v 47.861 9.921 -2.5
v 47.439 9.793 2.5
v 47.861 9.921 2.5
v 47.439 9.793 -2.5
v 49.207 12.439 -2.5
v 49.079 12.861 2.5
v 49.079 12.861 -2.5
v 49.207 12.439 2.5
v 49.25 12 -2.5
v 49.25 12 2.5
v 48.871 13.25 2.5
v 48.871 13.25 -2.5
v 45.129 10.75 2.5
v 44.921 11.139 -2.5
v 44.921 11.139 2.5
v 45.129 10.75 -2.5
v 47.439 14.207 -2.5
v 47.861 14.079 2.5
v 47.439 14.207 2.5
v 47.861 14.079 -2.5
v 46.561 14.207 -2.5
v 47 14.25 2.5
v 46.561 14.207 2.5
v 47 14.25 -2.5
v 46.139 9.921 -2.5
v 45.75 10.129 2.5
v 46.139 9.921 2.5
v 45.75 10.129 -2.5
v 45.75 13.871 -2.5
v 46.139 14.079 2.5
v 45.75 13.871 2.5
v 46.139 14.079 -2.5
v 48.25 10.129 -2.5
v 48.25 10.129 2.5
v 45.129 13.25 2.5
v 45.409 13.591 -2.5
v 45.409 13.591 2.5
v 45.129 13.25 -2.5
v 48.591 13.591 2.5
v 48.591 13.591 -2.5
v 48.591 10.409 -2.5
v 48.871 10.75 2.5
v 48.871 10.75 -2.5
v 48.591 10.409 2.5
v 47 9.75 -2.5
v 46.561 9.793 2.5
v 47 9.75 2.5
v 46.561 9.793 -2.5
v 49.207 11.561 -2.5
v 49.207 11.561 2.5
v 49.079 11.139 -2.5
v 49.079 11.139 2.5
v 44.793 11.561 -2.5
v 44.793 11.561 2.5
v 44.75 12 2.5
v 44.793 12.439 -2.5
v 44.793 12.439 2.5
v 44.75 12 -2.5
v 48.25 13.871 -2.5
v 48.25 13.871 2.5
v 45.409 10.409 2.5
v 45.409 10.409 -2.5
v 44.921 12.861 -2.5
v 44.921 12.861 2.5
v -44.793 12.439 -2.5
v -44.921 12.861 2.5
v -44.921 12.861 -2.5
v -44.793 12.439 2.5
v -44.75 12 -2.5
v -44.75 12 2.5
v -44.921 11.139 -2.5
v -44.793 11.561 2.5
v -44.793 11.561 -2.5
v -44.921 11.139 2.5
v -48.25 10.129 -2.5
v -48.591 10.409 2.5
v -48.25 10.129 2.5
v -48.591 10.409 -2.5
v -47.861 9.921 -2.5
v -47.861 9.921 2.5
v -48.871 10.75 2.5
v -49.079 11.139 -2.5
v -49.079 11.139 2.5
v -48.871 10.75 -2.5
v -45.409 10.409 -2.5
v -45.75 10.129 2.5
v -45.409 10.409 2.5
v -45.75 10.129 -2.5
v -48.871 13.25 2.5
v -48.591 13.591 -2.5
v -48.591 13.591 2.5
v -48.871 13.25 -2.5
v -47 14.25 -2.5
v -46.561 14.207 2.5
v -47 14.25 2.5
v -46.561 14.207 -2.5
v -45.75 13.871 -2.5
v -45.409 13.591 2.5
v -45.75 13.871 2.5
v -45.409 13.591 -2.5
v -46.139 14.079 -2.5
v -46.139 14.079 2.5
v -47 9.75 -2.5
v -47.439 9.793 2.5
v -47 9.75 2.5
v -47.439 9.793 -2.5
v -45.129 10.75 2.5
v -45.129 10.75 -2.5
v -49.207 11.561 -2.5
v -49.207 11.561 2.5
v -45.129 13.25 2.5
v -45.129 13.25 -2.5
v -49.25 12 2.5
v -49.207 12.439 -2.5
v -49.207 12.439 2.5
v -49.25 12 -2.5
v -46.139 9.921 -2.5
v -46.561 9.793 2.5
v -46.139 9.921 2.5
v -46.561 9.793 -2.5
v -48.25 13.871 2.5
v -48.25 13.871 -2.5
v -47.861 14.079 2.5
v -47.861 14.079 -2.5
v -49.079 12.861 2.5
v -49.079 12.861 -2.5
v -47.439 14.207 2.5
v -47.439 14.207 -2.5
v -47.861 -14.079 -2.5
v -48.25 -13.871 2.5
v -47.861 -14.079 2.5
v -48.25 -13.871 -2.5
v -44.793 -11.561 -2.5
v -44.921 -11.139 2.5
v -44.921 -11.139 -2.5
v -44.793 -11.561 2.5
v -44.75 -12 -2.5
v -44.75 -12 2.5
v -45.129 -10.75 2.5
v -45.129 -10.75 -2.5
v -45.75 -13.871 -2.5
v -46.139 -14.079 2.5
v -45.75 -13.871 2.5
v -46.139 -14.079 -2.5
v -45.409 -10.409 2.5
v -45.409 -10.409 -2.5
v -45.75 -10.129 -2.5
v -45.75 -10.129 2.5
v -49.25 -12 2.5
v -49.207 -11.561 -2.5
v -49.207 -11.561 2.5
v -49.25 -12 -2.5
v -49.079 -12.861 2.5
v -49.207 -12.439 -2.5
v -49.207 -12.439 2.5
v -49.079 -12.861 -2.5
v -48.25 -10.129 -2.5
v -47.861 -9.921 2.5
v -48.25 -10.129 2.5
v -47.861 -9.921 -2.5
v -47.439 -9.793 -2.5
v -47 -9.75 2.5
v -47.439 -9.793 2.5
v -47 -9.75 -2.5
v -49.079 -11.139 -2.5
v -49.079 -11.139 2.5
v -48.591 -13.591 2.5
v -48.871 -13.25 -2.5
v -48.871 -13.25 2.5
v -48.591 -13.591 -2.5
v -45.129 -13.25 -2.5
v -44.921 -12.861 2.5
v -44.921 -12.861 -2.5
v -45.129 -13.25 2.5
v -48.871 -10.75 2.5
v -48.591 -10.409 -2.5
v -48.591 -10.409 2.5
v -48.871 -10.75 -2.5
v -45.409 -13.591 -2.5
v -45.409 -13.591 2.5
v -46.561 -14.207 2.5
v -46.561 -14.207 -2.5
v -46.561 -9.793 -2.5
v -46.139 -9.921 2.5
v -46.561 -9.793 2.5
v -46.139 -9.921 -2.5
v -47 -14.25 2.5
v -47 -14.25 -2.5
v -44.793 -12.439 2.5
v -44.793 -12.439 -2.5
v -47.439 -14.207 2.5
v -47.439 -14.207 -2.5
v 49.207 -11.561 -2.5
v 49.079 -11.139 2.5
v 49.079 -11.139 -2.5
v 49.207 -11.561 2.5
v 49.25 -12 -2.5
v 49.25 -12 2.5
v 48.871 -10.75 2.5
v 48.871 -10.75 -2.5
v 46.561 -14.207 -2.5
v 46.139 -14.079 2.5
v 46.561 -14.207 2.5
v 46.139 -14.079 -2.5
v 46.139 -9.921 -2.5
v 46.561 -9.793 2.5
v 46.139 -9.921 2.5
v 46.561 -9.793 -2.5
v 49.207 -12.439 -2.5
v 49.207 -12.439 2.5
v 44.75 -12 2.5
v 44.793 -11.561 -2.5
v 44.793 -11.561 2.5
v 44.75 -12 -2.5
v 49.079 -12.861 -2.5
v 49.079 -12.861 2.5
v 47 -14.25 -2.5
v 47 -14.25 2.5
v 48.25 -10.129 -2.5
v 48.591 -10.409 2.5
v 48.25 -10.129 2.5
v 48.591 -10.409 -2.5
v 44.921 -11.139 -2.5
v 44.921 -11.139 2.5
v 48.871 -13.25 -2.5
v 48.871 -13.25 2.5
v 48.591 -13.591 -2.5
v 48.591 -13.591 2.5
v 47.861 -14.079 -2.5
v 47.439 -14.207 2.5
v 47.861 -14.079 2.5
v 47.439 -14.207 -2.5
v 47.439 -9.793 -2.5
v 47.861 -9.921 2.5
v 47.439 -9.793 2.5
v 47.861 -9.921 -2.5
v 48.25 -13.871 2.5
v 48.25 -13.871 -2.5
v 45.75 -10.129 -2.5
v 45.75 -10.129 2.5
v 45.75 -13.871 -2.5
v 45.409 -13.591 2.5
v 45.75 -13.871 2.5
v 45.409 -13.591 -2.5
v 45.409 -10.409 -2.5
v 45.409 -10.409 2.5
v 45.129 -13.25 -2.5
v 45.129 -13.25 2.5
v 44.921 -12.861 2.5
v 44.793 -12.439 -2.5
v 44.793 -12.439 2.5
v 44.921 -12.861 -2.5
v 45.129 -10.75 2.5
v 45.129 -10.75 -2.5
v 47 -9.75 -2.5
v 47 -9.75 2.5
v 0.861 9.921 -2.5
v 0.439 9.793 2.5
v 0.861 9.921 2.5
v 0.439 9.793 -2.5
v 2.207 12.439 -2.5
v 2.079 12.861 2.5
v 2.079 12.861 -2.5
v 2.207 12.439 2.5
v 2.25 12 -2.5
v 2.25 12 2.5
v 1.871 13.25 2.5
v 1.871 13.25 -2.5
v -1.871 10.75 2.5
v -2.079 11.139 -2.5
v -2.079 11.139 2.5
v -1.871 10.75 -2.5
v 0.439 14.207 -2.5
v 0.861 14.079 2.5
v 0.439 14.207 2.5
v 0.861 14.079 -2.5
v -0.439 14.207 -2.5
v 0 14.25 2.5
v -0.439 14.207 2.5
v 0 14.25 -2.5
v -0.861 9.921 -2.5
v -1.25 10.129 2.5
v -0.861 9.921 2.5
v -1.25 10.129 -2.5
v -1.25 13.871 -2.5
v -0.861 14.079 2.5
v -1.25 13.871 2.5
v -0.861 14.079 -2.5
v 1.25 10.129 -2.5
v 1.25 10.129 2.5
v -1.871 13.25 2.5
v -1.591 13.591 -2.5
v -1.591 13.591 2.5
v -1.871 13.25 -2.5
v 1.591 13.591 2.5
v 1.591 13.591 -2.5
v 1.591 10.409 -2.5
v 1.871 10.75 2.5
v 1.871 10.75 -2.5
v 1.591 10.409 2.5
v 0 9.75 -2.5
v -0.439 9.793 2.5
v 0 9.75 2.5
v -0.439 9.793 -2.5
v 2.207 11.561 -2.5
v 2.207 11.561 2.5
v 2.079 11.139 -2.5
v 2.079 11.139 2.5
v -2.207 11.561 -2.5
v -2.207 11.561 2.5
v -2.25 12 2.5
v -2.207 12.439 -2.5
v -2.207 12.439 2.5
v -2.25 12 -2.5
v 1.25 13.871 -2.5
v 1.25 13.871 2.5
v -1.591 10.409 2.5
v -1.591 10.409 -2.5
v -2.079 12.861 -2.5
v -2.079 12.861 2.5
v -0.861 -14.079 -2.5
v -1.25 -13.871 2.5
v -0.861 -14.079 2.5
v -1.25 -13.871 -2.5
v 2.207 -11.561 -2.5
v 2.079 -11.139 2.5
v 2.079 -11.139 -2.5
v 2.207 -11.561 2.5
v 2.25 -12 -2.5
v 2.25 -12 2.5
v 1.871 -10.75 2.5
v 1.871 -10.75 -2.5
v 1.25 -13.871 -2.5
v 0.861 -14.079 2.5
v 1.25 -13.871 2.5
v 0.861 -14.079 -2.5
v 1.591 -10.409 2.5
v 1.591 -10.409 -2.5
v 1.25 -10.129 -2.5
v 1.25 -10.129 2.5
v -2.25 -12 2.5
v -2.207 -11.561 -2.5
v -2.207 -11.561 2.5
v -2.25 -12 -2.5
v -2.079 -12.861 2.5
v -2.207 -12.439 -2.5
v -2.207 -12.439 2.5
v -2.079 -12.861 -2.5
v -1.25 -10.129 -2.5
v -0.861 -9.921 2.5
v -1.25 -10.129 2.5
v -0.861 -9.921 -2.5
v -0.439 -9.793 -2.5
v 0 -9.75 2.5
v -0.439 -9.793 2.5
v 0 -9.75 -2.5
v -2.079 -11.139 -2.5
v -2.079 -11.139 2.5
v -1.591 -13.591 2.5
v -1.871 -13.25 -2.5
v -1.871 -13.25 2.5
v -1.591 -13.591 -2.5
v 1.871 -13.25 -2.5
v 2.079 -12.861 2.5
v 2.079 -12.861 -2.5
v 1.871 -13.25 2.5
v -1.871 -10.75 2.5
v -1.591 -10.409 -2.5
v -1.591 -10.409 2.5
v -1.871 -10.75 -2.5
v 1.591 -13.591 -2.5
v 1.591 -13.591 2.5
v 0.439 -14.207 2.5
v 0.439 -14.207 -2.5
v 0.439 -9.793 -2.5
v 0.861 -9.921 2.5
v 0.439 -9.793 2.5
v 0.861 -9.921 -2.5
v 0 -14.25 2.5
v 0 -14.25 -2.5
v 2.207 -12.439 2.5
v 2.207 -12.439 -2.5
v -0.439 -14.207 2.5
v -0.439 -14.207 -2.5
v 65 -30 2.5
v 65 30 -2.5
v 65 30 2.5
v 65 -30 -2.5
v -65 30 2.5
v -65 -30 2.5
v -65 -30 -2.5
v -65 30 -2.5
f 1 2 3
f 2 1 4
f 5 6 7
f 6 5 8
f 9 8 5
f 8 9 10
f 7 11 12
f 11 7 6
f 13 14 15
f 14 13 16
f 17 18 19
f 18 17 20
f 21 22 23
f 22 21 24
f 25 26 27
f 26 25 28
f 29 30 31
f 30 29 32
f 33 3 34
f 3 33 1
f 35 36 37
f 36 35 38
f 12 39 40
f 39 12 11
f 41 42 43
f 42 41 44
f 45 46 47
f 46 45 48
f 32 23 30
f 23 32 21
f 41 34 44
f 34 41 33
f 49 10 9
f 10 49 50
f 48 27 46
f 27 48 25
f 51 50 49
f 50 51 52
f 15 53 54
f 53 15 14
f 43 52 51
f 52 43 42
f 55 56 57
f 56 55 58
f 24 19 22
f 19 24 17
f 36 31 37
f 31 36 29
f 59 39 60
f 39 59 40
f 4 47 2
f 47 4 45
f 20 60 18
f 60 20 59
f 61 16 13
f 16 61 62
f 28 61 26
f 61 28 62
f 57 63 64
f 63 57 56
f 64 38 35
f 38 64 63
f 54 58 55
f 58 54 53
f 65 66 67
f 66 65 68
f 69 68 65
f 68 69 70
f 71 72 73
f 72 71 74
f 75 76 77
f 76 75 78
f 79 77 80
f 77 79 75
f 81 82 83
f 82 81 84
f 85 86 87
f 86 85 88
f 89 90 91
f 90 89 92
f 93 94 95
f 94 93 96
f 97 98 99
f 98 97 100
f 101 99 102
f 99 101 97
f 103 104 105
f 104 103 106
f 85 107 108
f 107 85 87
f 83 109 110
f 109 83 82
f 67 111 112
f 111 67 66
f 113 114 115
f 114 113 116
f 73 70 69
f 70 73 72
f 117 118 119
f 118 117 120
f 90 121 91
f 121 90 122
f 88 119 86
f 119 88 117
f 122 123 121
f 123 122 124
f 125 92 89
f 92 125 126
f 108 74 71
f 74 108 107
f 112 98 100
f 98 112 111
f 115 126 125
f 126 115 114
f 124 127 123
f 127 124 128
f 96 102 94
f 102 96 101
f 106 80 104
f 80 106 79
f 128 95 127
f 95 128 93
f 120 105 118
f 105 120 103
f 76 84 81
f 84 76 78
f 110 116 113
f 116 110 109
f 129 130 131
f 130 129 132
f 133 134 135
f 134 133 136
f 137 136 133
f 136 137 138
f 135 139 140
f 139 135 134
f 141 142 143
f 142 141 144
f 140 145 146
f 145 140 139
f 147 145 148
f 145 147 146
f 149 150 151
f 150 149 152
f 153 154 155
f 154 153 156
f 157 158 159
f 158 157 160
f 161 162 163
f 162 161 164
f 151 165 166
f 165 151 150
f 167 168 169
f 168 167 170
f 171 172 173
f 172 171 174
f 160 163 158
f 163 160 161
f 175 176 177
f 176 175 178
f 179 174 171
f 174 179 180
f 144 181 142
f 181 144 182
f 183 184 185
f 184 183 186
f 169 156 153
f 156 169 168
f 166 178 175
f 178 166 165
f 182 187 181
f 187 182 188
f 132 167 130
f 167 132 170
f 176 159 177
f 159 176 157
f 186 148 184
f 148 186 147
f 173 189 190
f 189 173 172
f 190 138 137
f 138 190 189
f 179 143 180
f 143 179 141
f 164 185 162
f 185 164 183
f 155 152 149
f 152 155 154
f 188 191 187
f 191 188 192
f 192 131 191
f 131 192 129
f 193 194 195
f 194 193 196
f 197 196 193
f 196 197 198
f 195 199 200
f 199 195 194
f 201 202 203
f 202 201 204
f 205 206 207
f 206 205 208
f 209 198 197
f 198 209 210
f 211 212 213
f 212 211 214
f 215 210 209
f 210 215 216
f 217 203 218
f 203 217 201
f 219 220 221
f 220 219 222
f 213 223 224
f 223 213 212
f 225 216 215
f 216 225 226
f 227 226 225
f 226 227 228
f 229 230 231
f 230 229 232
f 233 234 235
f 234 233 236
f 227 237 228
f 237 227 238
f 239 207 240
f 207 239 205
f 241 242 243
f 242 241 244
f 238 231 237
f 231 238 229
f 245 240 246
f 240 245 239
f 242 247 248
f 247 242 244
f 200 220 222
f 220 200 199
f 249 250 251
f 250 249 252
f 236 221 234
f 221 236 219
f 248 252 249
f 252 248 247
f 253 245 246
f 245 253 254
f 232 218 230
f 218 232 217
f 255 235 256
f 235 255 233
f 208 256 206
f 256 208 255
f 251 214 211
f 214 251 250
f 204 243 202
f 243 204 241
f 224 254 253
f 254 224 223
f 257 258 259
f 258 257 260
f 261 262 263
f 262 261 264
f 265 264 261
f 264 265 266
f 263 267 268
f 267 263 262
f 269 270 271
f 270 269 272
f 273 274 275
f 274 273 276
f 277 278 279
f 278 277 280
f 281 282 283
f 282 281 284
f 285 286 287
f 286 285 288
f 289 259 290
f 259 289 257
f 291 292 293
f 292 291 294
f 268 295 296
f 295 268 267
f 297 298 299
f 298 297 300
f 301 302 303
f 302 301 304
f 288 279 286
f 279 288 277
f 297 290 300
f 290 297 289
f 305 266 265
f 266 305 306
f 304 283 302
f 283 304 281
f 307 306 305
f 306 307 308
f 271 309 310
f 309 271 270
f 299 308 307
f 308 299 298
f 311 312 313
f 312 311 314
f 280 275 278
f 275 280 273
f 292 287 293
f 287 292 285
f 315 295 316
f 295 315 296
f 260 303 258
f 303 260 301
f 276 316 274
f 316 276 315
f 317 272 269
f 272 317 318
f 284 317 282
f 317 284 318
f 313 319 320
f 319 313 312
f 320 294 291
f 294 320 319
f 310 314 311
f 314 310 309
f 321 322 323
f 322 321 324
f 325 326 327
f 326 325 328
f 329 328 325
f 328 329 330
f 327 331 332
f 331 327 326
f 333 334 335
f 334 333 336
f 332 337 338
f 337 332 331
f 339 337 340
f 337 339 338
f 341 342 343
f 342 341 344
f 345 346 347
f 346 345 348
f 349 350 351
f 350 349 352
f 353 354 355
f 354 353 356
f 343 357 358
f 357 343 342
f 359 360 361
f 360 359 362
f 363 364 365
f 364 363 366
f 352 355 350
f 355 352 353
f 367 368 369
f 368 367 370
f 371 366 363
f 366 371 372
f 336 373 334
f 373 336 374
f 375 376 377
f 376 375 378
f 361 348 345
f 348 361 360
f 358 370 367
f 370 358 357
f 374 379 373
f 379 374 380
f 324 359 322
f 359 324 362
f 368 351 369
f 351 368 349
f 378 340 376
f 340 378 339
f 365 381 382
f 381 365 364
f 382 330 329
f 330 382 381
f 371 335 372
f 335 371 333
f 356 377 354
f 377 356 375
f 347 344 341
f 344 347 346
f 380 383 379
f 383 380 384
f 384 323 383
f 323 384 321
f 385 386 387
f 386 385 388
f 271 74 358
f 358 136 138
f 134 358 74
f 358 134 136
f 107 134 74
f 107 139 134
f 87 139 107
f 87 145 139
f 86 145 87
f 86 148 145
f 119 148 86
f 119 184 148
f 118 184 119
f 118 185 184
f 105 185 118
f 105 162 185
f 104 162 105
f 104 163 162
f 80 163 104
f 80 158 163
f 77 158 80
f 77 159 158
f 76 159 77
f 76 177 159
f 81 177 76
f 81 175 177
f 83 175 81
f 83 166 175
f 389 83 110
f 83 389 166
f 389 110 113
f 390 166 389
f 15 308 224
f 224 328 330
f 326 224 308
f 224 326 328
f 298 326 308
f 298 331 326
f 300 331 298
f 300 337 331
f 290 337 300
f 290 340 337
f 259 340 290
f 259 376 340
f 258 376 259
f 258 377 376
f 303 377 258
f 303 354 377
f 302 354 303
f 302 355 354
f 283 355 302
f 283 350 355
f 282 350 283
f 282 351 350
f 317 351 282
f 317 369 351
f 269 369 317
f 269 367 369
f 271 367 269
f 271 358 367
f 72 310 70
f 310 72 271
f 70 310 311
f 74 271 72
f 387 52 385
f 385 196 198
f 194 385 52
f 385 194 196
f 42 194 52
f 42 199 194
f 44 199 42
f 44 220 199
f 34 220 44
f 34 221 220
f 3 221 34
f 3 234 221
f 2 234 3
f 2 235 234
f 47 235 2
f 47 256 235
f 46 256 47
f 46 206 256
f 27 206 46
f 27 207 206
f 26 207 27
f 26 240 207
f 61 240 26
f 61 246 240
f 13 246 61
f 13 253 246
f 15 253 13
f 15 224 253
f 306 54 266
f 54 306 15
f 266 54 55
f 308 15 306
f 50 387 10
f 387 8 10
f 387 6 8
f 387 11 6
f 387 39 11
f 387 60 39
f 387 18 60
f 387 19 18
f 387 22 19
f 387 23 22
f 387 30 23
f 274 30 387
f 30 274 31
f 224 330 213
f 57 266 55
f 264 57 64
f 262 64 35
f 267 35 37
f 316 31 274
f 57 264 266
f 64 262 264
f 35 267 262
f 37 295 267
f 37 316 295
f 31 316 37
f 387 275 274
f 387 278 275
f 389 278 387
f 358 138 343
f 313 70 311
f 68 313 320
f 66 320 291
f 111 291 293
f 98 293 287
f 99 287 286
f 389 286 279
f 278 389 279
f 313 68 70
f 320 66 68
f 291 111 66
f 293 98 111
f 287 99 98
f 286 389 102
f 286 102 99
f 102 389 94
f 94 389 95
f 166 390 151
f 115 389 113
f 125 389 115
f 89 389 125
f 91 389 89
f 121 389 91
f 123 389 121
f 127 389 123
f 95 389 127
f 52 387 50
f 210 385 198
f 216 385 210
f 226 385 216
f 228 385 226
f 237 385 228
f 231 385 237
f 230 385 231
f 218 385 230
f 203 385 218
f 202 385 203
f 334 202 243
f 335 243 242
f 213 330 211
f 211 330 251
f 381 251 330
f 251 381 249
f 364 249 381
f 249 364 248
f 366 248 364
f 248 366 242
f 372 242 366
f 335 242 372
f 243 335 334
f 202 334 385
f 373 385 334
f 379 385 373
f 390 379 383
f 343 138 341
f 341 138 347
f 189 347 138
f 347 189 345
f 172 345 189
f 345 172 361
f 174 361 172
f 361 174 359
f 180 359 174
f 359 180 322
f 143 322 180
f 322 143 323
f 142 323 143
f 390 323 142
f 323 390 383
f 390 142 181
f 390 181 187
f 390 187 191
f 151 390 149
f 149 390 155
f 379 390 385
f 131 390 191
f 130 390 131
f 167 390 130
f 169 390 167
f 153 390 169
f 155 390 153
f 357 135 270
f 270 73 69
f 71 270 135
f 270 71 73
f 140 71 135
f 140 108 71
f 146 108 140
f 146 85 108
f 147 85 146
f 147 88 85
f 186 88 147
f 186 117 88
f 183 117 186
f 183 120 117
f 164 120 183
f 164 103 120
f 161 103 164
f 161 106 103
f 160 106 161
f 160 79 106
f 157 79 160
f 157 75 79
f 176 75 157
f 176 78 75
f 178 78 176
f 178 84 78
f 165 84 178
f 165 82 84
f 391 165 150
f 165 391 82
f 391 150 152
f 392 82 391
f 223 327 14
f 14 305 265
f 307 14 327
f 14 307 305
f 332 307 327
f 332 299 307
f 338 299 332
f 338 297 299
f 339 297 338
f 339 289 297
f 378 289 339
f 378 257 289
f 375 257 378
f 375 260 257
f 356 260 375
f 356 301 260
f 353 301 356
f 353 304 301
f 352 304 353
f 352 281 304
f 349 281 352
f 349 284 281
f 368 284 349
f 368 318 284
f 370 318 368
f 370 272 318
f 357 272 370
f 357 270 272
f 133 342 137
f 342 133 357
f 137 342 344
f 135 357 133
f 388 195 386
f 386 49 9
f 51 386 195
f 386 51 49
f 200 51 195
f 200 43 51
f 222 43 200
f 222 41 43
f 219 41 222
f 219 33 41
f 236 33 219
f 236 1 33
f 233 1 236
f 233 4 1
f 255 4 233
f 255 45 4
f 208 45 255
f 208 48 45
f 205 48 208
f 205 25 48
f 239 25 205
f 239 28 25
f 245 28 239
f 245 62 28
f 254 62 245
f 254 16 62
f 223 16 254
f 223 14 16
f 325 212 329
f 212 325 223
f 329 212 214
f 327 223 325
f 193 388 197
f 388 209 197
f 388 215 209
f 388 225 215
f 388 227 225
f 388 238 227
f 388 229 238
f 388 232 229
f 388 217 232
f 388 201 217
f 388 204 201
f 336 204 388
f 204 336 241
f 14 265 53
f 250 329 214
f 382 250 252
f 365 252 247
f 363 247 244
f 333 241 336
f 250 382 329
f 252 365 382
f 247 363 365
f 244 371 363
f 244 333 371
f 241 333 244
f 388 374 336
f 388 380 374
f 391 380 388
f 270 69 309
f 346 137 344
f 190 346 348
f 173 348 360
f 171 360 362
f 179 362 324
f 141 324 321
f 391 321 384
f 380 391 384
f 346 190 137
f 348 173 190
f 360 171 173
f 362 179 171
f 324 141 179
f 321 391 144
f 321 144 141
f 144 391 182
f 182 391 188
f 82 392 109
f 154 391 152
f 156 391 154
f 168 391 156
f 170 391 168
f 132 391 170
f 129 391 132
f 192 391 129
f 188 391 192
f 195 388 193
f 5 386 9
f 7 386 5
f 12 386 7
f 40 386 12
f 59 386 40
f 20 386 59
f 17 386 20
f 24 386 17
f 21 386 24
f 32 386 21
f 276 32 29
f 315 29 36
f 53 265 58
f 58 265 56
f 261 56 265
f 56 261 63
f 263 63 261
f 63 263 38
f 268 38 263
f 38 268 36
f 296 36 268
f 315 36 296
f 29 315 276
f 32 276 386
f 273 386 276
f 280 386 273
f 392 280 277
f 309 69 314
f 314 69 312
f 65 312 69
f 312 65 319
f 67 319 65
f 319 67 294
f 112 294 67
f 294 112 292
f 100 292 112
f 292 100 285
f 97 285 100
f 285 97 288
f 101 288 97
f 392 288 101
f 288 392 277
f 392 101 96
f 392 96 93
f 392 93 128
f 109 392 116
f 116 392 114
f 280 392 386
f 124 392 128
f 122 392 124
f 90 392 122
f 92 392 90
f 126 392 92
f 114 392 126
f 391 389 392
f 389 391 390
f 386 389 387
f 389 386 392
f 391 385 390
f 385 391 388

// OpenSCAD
$fn = 32;

// ----------------------------------------------------------------------
// Corner plate 130 x 60 x 5
// 6 holes, centres taken from the edge offset
// ----------------------------------------------------------------------

// --- parameters (mm) ---
plate = [130, 60, 5];  // overall size (x, y, z)
holes = 6;             // number of holes the drawing asks for
hole_d = 4.5;          // hole diameter
edge = 18;             // hole centre offset from the plate edge

// --- derived feature positions (mm) ---
corner_x = plate[0] / 2 - edge;  // = 47   corner hole X
corner_y = plate[1] / 2 - edge;  // = 12   corner hole Y
feature_centers = [
  [corner_x, corner_y],
  [-corner_x, corner_y],
  [-corner_x, -corner_y],
  [corner_x, -corner_y],
  [0, corner_y],
  [0, -corner_y]
];   // hole centres the loop below drills

// plate outline, every hole drilled through with the same cutters
difference() {
  cube(plate, center = true);
  for (centre = feature_centers)
    translate([centre[0], centre[1], 0])
      cylinder(d = hole_d, h = plate[2] + 2, center = true);
}
